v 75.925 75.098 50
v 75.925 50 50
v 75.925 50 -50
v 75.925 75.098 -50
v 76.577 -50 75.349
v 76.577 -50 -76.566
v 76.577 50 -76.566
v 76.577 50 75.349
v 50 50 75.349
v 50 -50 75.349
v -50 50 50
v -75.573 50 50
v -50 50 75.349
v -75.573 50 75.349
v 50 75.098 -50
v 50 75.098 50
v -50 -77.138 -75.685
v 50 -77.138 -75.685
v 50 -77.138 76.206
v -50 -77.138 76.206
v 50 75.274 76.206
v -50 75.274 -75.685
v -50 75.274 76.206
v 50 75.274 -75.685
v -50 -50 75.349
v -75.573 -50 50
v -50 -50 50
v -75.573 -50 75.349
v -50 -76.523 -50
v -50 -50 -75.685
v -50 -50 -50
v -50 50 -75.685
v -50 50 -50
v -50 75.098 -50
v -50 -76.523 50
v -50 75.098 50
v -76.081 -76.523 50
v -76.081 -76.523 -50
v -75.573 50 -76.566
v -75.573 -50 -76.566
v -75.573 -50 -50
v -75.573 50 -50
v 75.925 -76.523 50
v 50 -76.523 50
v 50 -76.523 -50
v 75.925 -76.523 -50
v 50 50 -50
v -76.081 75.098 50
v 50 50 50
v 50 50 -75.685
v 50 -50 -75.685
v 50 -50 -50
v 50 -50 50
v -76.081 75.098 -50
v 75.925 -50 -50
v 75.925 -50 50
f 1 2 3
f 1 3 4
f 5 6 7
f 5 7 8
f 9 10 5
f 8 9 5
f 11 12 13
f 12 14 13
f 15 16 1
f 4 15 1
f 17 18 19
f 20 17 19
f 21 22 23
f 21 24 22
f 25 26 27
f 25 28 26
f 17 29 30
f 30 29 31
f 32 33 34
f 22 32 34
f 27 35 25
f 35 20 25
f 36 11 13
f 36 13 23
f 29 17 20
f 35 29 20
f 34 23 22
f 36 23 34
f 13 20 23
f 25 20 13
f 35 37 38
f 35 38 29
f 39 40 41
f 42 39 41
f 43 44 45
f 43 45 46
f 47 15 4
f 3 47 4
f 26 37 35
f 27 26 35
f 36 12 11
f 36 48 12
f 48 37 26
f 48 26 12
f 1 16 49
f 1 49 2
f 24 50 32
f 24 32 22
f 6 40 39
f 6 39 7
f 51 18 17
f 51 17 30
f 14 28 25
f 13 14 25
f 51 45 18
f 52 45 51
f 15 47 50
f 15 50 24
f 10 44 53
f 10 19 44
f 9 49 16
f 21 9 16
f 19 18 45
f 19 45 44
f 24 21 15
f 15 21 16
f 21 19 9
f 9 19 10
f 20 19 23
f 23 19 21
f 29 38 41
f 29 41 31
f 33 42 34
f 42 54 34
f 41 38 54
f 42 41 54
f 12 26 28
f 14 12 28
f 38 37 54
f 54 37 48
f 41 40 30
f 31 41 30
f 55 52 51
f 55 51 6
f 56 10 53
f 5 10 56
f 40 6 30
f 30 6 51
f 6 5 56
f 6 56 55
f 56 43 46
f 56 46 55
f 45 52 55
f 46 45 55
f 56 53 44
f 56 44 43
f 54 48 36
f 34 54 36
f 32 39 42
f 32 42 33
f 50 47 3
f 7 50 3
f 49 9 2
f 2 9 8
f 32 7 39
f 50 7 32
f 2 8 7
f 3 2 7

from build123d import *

# Parameters (mm, degrees)
F1_W          = 152.0064324141
F1_H          = 151.6206115484
F3_DEPTH      = 50
F3_DEPTH_BACK = 50
F0_W          = 152.1505489945
F0_H          = 151.9152671099
F4_DEPTH      = 50
F4_DEPTH_BACK = 50
F2_W          = 152.4115279317
F2_H          = 151.8903151155
F5_DEPTH      = 50
F5_DEPTH_BACK = 50


# Not quite as in the source:
# - the program builds the solid bodies; features that only make, move or delete a surface that nothing else refers to are left out


with BuildPart() as f3:
    # F1 (on Top) → F3 (new body, two sides)
    with BuildSketch(Plane.XY) as f3_sk:
        with Locations((-0.0777542591, -0.7124021649)):
            Rectangle(F1_W, F1_H)
    extrude(amount=F3_DEPTH)
    extrude(f3_sk.sketch, amount=-F3_DEPTH_BACK)

    # F0 (on Front) → F4 (join, two sides)
    with BuildSketch(Plane.XZ) as f4_sk:
        with Locations((0.5021430552, -0.6082579494)):
            Rectangle(F0_W, F0_H)
    extrude(amount=F4_DEPTH)
    extrude(f4_sk.sketch, amount=-F4_DEPTH_BACK)

    # F2 (on Right) → F5 (join, two sides)
    with BuildSketch(Plane.YZ) as f5_sk:
        with Locations((-0.9317584336, 0.2604238689)):
            Rectangle(F2_W, F2_H)
    extrude(amount=F5_DEPTH)
    extrude(f5_sk.sketch, amount=-F5_DEPTH_BACK)


solid = f3.part
